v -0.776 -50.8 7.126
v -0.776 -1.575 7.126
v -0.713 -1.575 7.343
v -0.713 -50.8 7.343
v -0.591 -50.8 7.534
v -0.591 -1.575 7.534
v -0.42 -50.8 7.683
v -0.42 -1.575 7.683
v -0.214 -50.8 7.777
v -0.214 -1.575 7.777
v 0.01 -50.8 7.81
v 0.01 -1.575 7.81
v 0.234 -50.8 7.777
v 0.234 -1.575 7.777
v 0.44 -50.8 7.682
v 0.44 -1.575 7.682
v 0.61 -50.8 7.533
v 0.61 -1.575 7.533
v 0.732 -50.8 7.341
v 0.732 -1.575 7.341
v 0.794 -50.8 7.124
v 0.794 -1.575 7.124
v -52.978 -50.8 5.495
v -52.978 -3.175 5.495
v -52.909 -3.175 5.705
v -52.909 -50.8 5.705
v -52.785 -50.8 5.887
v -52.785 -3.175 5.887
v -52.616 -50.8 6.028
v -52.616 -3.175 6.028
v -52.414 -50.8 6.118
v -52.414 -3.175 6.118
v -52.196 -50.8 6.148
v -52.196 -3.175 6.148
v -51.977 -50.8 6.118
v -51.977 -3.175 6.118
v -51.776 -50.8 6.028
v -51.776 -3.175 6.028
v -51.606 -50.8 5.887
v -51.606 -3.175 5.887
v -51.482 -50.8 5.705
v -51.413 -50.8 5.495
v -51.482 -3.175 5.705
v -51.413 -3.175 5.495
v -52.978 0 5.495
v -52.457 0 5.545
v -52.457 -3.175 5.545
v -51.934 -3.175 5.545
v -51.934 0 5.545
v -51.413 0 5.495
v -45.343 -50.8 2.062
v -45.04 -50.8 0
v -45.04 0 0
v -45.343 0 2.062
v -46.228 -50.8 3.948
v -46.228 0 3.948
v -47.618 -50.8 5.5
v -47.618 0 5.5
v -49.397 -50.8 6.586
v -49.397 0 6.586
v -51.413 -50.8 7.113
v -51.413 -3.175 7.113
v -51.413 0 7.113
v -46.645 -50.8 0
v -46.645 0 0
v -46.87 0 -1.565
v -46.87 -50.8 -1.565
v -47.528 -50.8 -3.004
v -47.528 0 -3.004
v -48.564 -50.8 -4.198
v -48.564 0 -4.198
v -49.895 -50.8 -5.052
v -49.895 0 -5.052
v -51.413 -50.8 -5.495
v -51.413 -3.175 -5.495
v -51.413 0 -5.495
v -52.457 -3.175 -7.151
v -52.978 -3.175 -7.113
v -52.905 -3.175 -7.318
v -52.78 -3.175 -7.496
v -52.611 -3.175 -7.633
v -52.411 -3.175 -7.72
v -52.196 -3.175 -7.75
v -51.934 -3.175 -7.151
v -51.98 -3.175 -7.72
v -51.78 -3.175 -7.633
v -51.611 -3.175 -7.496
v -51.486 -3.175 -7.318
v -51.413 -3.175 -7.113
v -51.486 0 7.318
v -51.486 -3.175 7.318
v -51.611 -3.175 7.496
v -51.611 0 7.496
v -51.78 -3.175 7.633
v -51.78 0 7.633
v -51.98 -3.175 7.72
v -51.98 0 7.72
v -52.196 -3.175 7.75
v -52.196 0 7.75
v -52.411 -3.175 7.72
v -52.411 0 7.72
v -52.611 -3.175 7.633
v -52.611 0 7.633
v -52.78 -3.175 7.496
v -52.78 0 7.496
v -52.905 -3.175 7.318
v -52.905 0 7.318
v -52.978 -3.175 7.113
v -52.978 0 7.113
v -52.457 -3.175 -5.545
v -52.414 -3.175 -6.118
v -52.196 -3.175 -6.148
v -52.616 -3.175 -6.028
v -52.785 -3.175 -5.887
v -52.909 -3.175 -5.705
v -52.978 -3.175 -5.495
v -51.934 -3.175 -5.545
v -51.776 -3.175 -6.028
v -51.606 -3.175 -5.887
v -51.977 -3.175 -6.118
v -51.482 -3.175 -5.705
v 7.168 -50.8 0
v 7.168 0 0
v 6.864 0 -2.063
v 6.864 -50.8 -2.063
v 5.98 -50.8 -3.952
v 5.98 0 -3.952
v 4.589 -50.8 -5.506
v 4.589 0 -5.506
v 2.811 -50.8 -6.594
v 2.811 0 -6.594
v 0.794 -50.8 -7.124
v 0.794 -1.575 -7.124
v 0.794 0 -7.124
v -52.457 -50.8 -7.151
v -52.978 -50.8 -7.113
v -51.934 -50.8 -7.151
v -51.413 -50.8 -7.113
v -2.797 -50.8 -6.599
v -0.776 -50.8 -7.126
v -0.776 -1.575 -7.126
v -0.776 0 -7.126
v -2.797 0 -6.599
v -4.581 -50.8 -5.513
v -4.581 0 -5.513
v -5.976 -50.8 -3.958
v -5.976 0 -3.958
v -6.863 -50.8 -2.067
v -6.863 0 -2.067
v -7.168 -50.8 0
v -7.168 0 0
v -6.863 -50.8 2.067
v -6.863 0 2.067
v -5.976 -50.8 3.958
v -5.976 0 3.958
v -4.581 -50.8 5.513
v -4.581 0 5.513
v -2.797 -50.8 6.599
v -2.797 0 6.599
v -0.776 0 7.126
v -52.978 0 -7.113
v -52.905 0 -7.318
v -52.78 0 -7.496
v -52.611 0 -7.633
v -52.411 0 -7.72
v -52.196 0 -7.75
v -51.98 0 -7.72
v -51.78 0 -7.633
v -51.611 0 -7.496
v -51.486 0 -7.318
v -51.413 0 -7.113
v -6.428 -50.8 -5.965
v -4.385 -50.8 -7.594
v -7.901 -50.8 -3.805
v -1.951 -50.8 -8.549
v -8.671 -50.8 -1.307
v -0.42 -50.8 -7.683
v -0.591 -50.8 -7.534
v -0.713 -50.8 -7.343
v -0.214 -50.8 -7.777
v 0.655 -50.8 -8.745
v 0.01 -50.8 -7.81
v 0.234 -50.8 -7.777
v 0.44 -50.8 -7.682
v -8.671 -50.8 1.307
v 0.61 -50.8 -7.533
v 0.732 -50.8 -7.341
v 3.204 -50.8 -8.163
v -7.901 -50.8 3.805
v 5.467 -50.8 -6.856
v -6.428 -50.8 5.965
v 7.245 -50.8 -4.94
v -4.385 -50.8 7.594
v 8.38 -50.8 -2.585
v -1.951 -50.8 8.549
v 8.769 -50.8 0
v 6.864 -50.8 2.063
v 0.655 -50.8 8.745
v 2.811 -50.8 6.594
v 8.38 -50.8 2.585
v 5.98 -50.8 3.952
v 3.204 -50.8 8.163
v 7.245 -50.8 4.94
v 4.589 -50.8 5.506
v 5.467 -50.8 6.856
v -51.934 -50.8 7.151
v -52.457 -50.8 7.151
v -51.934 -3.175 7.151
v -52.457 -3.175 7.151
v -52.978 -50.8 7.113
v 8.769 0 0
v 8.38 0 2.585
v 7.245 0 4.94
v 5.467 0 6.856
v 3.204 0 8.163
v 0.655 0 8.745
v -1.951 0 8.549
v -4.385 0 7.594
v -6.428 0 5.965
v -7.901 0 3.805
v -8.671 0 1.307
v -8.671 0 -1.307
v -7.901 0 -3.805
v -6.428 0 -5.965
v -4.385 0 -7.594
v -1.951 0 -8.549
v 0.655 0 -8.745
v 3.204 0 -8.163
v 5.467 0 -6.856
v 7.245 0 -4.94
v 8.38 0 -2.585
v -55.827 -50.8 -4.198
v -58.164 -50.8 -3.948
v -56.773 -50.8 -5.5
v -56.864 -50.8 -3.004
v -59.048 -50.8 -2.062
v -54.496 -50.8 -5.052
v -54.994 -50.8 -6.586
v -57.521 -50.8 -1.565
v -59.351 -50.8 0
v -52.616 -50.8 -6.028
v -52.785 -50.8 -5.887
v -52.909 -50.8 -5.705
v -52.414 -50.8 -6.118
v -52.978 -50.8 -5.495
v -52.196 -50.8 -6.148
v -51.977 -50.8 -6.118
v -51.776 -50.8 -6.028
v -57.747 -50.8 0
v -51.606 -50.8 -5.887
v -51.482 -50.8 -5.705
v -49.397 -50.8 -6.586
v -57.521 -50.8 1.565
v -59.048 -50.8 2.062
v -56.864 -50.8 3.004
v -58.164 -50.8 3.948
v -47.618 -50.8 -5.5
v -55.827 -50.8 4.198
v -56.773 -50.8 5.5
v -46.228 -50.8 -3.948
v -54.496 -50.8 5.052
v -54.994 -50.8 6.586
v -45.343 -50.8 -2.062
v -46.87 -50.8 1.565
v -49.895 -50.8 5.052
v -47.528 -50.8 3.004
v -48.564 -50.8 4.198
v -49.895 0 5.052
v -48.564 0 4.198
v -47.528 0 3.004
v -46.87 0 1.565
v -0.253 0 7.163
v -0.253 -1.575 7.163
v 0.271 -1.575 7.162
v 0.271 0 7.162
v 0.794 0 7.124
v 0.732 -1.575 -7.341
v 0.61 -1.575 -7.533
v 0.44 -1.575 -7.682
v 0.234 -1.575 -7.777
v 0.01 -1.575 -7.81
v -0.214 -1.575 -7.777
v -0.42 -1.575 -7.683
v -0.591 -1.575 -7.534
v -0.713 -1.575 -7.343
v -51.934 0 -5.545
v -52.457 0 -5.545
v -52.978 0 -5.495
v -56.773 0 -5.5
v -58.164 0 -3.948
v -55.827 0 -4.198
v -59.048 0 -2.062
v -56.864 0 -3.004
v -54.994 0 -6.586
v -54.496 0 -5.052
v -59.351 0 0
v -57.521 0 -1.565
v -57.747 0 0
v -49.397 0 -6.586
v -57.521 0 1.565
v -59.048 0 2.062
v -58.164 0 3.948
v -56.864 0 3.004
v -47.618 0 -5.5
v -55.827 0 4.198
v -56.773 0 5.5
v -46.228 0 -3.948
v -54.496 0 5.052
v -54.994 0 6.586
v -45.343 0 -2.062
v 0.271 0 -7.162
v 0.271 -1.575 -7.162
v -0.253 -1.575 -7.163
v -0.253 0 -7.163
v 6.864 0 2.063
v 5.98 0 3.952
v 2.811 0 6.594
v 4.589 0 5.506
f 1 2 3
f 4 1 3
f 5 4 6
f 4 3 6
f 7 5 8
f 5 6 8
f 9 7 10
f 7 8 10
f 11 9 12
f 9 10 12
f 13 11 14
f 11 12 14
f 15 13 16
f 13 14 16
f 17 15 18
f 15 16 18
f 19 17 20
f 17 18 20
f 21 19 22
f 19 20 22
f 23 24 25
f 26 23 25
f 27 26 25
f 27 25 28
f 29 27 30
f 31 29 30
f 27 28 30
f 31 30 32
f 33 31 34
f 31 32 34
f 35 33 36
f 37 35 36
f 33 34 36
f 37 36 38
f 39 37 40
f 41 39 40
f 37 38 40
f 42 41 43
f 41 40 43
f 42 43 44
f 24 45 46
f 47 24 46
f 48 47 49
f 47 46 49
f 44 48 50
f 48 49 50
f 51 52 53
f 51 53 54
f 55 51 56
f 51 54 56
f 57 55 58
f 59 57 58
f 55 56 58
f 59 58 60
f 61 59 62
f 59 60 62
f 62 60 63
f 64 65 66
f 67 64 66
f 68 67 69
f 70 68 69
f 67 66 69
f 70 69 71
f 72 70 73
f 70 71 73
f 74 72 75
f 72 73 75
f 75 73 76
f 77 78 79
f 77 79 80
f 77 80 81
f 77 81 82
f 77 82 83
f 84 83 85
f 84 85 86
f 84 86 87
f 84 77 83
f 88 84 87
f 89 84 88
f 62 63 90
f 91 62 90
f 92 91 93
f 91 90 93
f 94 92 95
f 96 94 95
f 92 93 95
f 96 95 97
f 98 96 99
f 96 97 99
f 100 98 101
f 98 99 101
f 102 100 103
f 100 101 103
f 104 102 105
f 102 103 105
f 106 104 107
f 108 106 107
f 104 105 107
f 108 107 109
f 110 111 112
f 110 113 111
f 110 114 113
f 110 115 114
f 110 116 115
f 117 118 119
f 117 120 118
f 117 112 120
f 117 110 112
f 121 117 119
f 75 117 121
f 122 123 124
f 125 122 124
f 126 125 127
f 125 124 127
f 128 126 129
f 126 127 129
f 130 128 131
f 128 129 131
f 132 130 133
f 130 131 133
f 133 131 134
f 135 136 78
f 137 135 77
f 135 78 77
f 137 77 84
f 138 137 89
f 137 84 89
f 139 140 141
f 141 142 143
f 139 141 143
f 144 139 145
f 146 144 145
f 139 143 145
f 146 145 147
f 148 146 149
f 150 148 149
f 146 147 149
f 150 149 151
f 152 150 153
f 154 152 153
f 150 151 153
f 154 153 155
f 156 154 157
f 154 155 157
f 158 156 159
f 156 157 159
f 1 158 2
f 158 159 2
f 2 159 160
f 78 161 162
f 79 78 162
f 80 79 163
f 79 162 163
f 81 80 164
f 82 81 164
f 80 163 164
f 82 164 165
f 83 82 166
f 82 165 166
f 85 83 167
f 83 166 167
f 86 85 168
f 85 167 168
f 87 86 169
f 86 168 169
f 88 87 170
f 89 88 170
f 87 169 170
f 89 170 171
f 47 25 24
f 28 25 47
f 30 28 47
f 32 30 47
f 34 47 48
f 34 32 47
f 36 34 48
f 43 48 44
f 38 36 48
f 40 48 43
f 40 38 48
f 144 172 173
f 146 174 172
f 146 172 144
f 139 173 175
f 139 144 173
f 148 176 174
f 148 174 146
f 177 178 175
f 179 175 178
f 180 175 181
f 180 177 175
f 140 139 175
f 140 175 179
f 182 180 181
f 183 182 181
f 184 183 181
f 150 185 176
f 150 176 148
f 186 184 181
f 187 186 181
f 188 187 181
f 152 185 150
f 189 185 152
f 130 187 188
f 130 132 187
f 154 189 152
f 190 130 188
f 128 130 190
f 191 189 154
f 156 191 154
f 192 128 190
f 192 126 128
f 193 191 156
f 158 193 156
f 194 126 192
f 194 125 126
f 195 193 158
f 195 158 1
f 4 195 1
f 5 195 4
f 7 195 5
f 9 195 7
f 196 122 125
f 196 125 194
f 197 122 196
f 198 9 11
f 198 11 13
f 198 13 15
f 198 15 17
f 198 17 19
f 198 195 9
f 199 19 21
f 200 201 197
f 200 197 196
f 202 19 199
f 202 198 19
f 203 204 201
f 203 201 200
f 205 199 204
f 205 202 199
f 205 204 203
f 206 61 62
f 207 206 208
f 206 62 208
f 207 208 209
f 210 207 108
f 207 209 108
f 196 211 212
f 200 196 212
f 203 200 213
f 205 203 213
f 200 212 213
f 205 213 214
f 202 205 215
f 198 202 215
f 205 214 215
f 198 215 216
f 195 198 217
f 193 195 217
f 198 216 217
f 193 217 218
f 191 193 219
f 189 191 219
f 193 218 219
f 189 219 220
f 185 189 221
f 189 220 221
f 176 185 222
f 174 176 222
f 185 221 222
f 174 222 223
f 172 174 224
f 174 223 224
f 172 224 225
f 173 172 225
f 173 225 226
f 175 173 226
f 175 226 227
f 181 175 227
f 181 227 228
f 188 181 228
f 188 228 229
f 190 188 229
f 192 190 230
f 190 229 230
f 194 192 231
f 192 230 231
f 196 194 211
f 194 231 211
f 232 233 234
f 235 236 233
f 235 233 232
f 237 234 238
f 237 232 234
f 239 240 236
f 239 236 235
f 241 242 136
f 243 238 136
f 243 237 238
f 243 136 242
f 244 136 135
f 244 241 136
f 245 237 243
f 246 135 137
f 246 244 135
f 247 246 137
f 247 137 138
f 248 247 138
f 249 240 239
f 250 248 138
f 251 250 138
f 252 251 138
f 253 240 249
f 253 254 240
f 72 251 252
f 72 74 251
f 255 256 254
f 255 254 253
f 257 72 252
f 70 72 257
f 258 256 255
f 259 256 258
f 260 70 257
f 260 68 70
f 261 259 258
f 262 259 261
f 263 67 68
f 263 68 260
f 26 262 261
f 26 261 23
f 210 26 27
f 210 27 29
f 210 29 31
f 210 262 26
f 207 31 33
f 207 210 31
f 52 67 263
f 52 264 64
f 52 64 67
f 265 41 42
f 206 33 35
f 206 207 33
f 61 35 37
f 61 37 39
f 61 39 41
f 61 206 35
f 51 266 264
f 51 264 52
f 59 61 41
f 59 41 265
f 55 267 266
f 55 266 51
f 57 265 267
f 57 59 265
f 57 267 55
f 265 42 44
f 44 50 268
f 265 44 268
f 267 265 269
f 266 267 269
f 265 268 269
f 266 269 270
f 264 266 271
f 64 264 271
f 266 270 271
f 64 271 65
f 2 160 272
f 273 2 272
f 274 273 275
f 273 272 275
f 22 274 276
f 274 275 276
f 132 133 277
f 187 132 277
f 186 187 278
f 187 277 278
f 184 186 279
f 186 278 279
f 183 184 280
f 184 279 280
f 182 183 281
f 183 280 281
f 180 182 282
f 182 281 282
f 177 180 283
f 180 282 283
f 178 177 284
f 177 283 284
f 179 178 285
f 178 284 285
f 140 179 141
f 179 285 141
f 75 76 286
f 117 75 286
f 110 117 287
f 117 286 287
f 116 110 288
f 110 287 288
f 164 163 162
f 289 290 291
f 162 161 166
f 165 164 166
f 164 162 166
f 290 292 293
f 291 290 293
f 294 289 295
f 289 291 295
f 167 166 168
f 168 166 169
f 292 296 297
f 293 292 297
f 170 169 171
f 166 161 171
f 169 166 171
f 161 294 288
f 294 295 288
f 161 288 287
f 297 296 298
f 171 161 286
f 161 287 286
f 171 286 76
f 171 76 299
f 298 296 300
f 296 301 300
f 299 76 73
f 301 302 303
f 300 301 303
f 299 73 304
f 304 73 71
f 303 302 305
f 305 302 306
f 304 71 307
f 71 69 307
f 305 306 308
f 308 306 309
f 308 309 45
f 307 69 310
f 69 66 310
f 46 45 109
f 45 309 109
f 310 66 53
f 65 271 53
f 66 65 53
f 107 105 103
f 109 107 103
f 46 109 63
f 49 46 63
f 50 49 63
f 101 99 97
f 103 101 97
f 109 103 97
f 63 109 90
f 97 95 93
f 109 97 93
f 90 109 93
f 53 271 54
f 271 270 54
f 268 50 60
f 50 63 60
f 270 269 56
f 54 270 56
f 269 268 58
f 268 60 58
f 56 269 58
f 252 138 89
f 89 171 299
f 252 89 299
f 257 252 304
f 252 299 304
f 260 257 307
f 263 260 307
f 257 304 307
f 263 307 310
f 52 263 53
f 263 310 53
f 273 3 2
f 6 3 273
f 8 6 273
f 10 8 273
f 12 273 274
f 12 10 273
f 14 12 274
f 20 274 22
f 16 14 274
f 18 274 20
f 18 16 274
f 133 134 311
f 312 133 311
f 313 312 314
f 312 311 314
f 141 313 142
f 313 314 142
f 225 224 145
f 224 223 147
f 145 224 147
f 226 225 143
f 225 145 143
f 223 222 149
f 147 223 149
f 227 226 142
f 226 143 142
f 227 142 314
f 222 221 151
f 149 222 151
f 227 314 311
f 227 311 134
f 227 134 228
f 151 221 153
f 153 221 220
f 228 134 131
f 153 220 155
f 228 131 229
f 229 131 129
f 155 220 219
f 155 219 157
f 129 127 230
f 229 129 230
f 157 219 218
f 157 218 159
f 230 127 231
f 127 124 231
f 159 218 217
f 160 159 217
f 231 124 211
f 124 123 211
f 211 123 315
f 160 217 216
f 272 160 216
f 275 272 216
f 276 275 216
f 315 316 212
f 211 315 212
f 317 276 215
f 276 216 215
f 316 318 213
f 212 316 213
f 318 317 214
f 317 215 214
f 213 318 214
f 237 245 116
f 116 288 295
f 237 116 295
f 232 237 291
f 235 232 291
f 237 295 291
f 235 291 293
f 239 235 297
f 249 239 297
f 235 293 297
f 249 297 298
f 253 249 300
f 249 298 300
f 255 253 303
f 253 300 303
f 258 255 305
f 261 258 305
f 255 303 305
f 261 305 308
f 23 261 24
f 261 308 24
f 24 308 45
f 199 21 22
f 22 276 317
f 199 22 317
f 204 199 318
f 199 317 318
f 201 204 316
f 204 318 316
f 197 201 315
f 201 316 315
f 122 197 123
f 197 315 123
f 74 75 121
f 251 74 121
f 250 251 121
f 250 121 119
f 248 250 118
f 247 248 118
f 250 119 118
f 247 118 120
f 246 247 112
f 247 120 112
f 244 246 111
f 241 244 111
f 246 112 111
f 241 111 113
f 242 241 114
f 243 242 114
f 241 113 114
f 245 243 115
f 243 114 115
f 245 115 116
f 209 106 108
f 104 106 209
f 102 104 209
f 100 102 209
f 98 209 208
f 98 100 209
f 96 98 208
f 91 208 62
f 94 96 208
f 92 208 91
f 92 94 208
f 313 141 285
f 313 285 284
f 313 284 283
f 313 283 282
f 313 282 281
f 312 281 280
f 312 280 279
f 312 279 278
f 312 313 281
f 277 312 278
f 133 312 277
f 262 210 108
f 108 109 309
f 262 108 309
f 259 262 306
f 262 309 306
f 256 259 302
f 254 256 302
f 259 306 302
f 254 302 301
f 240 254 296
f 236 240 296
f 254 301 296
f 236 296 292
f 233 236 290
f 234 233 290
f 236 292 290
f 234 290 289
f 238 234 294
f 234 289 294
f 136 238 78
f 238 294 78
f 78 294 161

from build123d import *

# Parameters (mm, degrees)
F1_DEPTH = 50.8
F2_DEPTH = 3.175
F3_R     = 8.7691254342
F4_DEPTH = 50.8
F5_DEPTH = 1.5748


# Not quite as in the source:
# - a length typed as a fraction of an inch, garbled in the dataset ("3 / 203.2 mm" for 3/8 in), is restored
# - a feature names something its author has since deleted; it is built from what else it names


with BuildPart() as f1:
    # F0 (on Front) → F1 (new body)
    with BuildSketch(Plane.XZ):
        with BuildLine():
            ThreePointArc((-51.4129851972, -7.1128706299), (-46.8661970111, -4.7751922682), (-45.0398449824, 0))
            ThreePointArc((-45.0398449824, 0), (-46.8661970111, 4.7751922682), (-51.4129851972, 7.1128706299))
            ThreePointArc((-51.4129851972, 7.1128706299), (-52.1956458688, 7.1558008863), (-52.9783065404, 7.1128706299))
            ThreePointArc((-52.9783065404, 7.1128706299), (-59.3514467551, 0), (-52.9783065404, -7.1128706299))
            ThreePointArc((-52.9783065404, -7.1128706299), (-52.1956458688, -7.1558008863), (-51.4129851972, -7.1128706299))
        make_face()
        with BuildLine():
            ThreePointArc((-51.4129851972, 5.4954455624), (-48.0029766717, 3.6378571523), (-46.6447468735, 0))
            ThreePointArc((-46.6447468735, 0), (-48.0029766717, -3.6378571523), (-51.4129851972, -5.4954455624))
            ThreePointArc((-51.4129851972, -5.4954455624), (-52.1956458688, -6.1481072421), (-52.9783065404, -5.4954455624))
            ThreePointArc((-52.9783065404, -5.4954455624), (-57.7465448641, 0), (-52.9783065404, 5.4954455624))
            ThreePointArc((-52.9783065404, 5.4954455624), (-52.1956458688, 6.1481072421), (-51.4129851972, 5.4954455624))
        make_face(mode=Mode.SUBTRACT)
    extrude(amount=F1_DEPTH)

    # F0 (on Front) → F2 (join)
    with BuildSketch(Plane.XZ):
        with BuildLine():
            ThreePointArc((-51.4129851972, -7.1128706299), (-46.8661970111, -4.7751922682), (-45.0398449824, 0))
            ThreePointArc((-45.0398449824, 0), (-46.8661970111, 4.7751922682), (-51.4129851972, 7.1128706299))
            ThreePointArc((-51.4129851972, 7.1128706299), (-52.1956458688, 7.1558008863), (-52.9783065404, 7.1128706299))
            ThreePointArc((-52.9783065404, 7.1128706299), (-59.3514467551, 0), (-52.9783065404, -7.1128706299))
            ThreePointArc((-52.9783065404, -7.1128706299), (-52.1956458688, -7.1558008863), (-51.4129851972, -7.1128706299))
        make_face()
        with BuildLine():
            ThreePointArc((-51.4129851972, 5.4954455624), (-48.0029766717, 3.6378571523), (-46.6447468735, 0))
            ThreePointArc((-46.6447468735, 0), (-48.0029766717, -3.6378571523), (-51.4129851972, -5.4954455624))
            ThreePointArc((-51.4129851972, -5.4954455624), (-52.1956458688, -6.1481072421), (-52.9783065404, -5.4954455624))
            ThreePointArc((-52.9783065404, -5.4954455624), (-57.7465448641, 0), (-52.9783065404, 5.4954455624))
            ThreePointArc((-52.9783065404, 5.4954455624), (-52.1956458688, 6.1481072421), (-51.4129851972, 5.4954455624))
        make_face(mode=Mode.SUBTRACT)
        with BuildLine():
            ThreePointArc((-52.9783065404, 5.4954455624), (-52.1956458688, 5.5508989953), (-51.4129851972, 5.4954455624))
            ThreePointArc((-51.4129851972, 5.4954455624), (-52.1956458688, 6.1481072421), (-52.9783065404, 5.4954455624))
        make_face()
        with BuildLine():
            ThreePointArc((-52.9783065404, -5.4954455624), (-52.1956458688, -6.1481072421), (-51.4129851972, -5.4954455624))
            ThreePointArc((-51.4129851972, -5.4954455624), (-52.1956458688, -5.5508989953), (-52.9783065404, -5.4954455624))
        make_face()
        with BuildLine():
            ThreePointArc((-52.9783065404, 7.1128706299), (-52.1956458688, 7.1558008863), (-51.4129851972, 7.1128706299))
            ThreePointArc((-51.4129851972, 7.1128706299), (-52.1956458688, 7.7496697029), (-52.9783065404, 7.1128706299))
        make_face()
        with BuildLine():
            ThreePointArc((-52.9783065404, -7.1128706299), (-52.1956458688, -7.7496697029), (-51.4129851972, -7.1128706299))
            ThreePointArc((-51.4129851972, -7.1128706299), (-52.1956458688, -7.1558008863), (-52.9783065404, -7.1128706299))
        make_face()
    extrude(amount=F2_DEPTH)


with BuildPart() as f4:
    # F3 (on Front) → F4 (new body)
    with BuildSketch(Plane.XZ):
        Circle(F3_R)
        with BuildLine():
            ThreePointArc((0.793711748, 7.1235415414), (5.3415283007, 4.779424426), (7.1676232066, 0))
            ThreePointArc((7.1676232066, 0), (5.3415283007, -4.779424426), (0.793711748, -7.1235415414))
            ThreePointArc((0.793711748, -7.1235415414), (0.0099196257, -7.8095114052), (-0.7756125997, -7.1255348941))
            ThreePointArc((-0.7756125997, -7.1255348941), (-7.1676232066, 0), (-0.7756125997, 7.1255348941))
            ThreePointArc((-0.7756125997, 7.1255348941), (0.0099196257, 7.8095114052), (0.793711748, 7.1235415414))
        make_face(mode=Mode.SUBTRACT)
    extrude(amount=F4_DEPTH)

    # F3 (on Front) → F5 (join)
    with BuildSketch(Plane.XZ):
        with BuildLine():
            ThreePointArc((-0.7756125997, 7.1255348941), (0.0091042933, 7.1676174244), (0.793711748, 7.1235415414))
            ThreePointArc((0.793711748, 7.1235415414), (0.0099196257, 7.8095114052), (-0.7756125997, 7.1255348941))
        make_face()
        with BuildLine():
            ThreePointArc((-0.7756125997, -7.1255348941), (0.0099196257, -7.8095114052), (0.793711748, -7.1235415414))
            ThreePointArc((0.793711748, -7.1235415414), (0.0091042933, -7.1676174244), (-0.7756125997, -7.1255348941))
        make_face()
    extrude(amount=F5_DEPTH)


solid = Compound([f1.part, f4.part])
